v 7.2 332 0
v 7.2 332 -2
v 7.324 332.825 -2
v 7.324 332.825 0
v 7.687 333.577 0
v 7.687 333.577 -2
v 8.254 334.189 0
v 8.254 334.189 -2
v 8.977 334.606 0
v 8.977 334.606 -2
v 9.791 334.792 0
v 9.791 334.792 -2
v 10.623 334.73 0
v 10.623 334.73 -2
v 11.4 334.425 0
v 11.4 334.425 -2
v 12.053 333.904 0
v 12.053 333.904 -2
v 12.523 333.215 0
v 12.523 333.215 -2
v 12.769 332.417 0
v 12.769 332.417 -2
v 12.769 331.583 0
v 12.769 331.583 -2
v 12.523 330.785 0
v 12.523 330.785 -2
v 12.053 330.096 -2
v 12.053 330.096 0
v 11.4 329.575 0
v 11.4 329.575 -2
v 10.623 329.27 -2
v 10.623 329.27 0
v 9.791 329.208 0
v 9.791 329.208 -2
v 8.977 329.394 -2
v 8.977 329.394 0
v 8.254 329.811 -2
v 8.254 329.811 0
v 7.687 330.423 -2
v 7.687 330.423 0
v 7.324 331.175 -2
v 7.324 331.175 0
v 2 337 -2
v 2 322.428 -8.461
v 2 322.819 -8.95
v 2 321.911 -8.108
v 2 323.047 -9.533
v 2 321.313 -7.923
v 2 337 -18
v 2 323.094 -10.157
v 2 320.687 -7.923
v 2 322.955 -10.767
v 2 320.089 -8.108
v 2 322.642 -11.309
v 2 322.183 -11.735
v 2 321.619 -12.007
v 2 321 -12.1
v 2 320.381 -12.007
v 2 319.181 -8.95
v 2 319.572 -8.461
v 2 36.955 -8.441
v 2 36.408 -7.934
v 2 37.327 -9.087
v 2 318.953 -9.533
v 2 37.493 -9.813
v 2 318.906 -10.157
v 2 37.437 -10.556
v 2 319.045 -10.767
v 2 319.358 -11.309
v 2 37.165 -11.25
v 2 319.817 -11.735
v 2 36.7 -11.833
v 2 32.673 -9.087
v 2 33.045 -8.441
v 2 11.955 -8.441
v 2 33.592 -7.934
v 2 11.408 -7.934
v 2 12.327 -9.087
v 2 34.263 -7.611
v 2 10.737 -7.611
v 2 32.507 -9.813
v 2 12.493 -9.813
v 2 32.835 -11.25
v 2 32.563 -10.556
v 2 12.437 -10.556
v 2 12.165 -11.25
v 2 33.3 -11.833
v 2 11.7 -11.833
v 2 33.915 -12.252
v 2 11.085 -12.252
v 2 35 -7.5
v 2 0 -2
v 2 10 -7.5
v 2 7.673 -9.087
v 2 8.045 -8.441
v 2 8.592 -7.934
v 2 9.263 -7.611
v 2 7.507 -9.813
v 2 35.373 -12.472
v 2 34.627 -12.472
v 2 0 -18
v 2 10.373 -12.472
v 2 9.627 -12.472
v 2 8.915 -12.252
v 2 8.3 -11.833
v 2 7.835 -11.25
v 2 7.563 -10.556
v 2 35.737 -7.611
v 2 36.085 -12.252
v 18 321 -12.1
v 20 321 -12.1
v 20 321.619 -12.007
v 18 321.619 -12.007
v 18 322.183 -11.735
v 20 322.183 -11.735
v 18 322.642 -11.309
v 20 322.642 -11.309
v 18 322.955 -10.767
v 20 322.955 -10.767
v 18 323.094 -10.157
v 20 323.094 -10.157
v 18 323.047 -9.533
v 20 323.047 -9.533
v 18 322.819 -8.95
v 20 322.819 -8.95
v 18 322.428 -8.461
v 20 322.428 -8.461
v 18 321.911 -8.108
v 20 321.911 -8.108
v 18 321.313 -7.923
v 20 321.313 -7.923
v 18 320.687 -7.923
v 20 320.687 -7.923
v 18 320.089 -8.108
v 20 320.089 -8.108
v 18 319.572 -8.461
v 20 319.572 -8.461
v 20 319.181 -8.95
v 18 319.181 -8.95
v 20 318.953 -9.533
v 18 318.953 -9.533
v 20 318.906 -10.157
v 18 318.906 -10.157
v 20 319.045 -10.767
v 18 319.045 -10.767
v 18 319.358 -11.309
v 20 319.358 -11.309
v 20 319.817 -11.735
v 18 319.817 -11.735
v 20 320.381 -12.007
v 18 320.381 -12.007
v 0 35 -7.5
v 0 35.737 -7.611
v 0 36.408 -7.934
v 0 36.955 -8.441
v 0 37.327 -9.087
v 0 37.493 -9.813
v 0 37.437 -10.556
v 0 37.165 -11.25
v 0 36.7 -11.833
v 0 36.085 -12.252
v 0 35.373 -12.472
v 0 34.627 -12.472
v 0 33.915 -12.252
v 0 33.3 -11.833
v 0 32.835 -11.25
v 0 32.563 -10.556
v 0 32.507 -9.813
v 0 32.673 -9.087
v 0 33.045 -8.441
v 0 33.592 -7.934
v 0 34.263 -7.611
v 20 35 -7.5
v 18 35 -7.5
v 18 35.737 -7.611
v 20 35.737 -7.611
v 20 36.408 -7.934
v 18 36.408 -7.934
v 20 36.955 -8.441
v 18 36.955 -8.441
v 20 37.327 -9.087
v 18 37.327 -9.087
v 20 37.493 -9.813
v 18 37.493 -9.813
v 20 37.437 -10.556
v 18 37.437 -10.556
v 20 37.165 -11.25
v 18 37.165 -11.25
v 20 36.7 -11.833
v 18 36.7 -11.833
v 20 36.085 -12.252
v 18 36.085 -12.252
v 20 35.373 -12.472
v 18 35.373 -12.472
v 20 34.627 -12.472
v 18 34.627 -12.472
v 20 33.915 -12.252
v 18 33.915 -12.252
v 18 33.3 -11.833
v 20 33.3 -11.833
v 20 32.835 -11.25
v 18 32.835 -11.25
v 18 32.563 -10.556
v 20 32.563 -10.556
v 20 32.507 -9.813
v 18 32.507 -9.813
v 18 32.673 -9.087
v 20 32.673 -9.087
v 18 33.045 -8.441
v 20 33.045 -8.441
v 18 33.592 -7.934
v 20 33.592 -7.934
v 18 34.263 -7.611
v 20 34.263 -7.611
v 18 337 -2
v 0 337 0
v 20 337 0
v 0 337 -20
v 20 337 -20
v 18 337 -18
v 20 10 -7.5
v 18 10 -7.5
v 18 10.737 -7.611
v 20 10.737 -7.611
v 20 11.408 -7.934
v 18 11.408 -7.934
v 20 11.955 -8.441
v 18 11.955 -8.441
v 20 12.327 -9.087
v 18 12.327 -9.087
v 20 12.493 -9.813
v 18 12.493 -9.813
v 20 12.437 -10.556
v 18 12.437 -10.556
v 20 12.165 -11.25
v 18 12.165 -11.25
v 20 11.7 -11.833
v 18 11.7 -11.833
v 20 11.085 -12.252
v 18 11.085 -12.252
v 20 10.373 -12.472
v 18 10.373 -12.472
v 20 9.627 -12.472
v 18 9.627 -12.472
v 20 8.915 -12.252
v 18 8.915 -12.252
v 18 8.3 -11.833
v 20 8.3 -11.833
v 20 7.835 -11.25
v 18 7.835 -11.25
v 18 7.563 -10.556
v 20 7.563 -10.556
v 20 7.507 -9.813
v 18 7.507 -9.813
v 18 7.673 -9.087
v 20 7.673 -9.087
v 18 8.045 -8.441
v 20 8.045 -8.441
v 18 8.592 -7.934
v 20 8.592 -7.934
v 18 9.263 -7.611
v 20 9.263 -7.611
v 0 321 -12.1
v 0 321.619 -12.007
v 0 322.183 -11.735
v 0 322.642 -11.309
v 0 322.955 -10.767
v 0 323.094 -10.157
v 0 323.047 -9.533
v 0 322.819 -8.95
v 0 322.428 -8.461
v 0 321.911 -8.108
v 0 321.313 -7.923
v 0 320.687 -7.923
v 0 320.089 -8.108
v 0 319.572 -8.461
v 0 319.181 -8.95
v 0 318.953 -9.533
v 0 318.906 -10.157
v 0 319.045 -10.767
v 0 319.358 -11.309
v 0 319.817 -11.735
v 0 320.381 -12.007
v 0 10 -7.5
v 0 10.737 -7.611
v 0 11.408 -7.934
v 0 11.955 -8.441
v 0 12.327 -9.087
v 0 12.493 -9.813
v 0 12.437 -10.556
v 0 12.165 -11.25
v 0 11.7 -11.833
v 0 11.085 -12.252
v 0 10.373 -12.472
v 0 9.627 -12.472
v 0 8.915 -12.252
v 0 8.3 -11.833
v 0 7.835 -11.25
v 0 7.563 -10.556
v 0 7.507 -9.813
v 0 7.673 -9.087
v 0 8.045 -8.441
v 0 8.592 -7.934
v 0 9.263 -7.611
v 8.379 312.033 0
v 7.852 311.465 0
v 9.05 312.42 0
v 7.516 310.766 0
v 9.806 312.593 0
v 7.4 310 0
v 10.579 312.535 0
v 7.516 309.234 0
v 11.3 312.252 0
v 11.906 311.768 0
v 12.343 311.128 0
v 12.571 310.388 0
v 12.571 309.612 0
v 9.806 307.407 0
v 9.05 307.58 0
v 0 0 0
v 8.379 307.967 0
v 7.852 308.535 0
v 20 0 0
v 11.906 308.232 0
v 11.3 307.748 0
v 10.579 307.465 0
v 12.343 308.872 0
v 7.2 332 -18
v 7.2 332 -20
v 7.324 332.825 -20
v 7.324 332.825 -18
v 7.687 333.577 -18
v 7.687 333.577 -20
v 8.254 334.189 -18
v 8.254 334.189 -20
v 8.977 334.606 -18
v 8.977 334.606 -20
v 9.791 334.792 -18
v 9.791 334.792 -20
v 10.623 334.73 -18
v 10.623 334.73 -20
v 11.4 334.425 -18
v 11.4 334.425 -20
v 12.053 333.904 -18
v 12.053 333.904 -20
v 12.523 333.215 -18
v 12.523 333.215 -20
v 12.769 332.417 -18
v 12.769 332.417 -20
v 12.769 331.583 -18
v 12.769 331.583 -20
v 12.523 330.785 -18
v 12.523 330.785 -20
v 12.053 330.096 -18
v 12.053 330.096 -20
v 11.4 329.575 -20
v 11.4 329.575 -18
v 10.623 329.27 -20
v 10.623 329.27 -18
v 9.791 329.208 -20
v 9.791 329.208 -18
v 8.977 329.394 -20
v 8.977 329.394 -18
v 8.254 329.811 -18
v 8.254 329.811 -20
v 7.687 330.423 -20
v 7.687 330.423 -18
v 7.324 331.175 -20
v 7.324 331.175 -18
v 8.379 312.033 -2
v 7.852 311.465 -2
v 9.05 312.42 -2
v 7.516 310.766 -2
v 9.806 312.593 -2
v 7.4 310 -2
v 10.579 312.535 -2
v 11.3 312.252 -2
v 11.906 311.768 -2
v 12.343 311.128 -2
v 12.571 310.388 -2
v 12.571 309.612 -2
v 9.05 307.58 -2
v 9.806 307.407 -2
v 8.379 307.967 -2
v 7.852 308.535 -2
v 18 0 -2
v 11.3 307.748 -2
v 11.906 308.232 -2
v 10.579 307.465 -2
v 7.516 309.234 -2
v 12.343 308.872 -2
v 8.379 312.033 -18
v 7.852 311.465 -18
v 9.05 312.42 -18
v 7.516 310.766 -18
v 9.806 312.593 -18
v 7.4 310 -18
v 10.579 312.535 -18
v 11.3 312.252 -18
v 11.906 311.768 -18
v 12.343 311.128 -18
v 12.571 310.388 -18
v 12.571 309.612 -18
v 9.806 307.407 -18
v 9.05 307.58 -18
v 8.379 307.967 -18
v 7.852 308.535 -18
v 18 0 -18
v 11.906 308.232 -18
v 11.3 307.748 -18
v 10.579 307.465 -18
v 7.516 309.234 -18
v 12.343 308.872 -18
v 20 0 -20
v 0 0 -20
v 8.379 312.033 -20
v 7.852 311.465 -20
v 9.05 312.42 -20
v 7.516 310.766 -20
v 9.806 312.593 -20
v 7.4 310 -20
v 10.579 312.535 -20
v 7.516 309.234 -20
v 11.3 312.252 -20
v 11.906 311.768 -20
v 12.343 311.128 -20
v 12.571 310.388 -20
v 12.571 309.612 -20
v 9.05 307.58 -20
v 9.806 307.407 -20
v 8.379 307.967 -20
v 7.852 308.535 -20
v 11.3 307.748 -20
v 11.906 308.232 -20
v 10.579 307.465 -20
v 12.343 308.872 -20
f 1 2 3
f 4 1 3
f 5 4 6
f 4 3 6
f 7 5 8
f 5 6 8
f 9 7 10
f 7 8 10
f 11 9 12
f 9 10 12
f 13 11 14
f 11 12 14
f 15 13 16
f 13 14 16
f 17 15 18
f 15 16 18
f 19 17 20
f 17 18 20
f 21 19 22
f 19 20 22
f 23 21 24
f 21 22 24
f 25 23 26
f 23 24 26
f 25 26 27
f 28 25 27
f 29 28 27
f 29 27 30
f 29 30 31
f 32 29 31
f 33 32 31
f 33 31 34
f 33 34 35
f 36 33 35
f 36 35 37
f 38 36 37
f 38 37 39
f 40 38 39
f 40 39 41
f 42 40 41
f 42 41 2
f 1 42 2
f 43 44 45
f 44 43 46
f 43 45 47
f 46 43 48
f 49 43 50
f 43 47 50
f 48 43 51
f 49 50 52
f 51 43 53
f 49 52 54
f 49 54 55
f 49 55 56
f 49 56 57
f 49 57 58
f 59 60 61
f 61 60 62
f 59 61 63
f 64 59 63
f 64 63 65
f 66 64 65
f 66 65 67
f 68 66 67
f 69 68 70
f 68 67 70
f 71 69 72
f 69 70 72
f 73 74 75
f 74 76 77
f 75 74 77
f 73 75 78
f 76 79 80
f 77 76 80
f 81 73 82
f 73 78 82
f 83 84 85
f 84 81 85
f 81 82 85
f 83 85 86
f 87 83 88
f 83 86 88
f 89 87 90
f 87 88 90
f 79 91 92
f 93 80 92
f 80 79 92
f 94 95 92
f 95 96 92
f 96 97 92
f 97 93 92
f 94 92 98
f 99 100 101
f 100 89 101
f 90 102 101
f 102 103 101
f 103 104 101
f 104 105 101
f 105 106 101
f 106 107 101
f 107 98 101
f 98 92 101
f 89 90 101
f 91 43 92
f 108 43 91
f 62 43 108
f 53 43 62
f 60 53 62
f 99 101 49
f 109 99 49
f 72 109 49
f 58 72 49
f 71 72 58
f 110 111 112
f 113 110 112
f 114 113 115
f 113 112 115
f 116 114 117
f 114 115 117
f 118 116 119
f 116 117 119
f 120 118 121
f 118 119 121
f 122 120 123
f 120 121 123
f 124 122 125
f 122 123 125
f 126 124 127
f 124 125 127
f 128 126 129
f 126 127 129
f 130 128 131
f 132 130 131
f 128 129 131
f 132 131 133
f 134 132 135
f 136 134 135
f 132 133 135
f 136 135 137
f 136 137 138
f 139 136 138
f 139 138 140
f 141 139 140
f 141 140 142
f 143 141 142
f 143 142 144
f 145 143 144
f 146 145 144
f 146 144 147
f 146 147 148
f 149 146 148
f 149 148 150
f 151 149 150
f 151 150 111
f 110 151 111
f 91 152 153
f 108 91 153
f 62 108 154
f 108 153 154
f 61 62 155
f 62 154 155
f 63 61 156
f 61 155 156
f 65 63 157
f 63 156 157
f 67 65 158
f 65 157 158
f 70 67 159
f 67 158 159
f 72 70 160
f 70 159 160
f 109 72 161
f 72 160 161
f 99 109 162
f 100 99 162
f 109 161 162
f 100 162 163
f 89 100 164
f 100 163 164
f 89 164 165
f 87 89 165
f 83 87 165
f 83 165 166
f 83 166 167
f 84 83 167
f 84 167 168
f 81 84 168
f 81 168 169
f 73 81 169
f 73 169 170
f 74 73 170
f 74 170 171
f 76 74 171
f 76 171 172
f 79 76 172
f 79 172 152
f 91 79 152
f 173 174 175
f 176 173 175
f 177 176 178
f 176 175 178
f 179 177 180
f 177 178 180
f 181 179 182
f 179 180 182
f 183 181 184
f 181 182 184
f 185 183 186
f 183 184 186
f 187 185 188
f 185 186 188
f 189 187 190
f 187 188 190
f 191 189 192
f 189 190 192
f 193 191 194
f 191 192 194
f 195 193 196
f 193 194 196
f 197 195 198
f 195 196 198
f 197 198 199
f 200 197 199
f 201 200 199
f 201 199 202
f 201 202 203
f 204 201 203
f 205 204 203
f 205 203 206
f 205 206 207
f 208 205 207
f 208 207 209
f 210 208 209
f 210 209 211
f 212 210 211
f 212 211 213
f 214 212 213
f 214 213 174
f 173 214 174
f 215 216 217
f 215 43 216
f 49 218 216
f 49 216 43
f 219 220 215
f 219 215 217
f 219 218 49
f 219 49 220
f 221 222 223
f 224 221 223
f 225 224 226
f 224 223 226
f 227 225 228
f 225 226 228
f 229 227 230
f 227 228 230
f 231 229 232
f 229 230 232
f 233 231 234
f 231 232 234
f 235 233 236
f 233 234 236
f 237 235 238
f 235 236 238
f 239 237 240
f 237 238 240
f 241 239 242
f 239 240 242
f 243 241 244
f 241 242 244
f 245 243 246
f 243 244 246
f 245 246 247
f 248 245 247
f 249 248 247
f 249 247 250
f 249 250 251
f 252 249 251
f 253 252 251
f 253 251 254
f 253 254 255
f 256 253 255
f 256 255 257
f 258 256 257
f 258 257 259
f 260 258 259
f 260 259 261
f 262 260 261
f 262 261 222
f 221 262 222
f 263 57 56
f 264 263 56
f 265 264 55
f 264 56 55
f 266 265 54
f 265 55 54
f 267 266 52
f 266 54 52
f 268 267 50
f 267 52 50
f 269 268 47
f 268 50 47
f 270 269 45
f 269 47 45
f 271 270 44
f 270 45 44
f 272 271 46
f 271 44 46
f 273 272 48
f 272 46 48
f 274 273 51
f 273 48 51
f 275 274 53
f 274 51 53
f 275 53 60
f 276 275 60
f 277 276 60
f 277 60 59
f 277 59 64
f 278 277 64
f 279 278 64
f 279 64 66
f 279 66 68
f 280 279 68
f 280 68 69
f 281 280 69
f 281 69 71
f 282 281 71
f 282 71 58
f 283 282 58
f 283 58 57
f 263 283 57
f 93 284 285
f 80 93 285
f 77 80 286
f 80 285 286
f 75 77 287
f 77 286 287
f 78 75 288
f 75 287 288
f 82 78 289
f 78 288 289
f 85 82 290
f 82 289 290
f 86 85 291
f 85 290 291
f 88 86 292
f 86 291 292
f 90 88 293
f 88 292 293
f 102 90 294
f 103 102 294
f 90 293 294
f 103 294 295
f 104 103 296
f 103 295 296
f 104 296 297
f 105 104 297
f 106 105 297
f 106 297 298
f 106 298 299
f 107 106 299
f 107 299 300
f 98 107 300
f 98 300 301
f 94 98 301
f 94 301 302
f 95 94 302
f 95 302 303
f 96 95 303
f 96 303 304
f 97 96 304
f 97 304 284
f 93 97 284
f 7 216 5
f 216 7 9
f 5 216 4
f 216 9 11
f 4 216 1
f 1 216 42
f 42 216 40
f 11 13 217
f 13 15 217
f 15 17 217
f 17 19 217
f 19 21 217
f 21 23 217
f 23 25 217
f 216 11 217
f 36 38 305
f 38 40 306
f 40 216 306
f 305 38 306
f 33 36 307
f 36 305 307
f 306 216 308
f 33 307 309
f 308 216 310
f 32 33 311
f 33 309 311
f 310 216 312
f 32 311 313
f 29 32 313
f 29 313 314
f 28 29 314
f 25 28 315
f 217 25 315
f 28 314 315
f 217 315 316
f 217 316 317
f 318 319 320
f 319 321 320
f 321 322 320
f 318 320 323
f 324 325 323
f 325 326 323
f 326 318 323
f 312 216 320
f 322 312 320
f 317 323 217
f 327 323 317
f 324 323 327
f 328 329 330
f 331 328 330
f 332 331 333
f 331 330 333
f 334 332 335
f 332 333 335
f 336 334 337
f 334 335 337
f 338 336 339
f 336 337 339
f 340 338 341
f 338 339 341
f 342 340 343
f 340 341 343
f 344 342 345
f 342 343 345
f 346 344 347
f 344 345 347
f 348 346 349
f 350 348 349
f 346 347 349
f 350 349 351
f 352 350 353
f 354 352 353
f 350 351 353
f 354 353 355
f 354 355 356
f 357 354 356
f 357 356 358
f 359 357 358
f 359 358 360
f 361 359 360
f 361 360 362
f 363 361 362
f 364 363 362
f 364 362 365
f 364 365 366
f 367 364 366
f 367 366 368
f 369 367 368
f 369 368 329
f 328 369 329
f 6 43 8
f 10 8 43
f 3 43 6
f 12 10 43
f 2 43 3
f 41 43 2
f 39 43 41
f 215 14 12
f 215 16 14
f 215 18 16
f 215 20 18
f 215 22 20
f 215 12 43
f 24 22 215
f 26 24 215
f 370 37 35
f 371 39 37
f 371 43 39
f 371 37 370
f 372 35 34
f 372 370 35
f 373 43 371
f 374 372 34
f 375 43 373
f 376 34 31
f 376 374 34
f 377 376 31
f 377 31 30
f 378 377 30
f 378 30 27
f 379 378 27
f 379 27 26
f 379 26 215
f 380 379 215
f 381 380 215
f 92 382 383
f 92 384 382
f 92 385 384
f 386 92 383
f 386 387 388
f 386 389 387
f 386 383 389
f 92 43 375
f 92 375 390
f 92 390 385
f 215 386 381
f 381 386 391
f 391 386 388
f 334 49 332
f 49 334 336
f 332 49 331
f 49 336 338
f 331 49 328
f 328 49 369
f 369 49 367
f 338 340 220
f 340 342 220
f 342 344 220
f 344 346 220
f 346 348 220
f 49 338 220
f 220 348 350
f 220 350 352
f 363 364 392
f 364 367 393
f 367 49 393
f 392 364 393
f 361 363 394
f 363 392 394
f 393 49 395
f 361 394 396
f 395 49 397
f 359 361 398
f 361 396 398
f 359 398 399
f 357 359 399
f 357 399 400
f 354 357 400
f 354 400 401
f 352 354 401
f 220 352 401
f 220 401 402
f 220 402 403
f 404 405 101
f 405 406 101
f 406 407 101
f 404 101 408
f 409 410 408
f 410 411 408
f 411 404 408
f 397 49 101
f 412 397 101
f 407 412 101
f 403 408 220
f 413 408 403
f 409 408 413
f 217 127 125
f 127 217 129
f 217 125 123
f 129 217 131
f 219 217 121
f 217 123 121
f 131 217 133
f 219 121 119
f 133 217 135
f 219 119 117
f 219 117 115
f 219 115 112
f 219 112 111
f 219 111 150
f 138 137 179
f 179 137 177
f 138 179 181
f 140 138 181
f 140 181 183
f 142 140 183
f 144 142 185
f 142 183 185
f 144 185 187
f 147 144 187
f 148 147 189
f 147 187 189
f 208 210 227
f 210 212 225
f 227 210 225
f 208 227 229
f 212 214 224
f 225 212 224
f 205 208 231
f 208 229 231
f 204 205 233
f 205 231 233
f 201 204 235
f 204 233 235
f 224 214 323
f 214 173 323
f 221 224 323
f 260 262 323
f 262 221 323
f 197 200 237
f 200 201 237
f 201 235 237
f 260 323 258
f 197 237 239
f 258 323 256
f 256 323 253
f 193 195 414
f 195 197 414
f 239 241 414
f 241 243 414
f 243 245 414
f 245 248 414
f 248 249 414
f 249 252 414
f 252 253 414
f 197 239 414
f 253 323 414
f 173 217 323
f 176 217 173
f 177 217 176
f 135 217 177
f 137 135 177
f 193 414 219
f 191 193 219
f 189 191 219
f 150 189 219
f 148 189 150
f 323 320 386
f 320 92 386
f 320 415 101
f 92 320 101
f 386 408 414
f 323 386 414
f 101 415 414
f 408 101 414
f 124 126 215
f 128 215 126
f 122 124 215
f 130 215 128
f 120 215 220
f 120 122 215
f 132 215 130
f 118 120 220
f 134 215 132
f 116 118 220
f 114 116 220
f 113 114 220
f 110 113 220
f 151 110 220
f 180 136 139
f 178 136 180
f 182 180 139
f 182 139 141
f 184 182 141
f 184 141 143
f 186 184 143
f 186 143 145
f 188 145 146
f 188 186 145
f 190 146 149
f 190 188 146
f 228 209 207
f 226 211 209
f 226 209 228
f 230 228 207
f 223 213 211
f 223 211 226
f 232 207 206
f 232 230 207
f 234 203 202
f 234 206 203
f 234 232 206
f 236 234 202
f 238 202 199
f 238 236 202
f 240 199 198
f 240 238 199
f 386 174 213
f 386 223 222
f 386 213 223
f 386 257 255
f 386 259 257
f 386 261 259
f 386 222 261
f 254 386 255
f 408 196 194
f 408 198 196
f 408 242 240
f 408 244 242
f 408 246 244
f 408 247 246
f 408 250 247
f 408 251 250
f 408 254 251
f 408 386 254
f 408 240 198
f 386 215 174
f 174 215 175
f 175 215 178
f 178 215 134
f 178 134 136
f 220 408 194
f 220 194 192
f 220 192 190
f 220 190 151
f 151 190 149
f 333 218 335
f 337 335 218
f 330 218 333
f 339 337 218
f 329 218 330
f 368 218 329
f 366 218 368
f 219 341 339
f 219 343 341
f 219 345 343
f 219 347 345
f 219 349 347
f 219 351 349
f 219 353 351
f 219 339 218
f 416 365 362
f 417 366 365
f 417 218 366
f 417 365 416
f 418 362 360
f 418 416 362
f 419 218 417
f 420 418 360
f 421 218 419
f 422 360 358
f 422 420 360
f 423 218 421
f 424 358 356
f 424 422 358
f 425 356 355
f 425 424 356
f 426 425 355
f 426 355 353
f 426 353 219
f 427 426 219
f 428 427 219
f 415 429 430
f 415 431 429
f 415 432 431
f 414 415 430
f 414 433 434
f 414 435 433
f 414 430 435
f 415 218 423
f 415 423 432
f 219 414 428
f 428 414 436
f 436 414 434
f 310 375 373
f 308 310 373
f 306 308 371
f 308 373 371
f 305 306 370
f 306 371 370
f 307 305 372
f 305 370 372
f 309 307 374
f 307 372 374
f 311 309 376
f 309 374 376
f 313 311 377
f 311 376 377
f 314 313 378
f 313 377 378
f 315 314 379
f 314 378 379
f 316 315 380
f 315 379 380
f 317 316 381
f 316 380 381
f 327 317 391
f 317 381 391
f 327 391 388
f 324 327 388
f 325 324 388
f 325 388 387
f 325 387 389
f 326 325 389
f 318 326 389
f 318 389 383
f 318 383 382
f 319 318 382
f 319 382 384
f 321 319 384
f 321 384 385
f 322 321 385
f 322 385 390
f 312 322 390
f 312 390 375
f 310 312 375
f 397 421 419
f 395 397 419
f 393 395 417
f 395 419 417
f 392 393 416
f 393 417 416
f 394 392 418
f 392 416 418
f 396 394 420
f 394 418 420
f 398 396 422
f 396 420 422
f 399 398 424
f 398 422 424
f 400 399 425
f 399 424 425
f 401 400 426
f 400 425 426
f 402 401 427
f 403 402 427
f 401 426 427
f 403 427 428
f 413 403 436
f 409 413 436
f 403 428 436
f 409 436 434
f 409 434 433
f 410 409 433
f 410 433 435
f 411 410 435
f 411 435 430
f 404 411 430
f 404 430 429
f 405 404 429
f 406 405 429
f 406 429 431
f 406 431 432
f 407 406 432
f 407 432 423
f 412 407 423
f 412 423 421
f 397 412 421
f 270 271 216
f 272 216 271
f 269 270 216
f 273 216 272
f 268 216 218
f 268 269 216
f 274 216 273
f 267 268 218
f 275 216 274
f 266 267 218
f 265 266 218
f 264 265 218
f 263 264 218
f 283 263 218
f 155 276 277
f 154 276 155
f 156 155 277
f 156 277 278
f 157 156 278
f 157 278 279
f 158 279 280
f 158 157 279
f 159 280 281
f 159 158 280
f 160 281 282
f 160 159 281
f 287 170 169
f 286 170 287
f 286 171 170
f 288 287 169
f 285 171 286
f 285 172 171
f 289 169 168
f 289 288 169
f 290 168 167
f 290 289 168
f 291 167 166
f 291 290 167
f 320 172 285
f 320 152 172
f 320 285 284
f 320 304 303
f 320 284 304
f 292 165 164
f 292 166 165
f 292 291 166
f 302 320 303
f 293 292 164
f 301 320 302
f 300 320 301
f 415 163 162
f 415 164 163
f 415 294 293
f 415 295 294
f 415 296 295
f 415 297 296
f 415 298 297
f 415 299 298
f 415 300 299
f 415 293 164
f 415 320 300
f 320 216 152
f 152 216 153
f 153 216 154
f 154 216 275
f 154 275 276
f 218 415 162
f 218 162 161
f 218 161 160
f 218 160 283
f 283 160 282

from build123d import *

# Parameters (mm, degrees)
ESBO_O1_W             = 20
ESBO_O1_H             = 20
ESBO_O1_W_2           = 16
ESBO_O1_H_2           = 16
EXTRUS_O_FINA1_DEPTH  = 337
ESBO_O2_R             = 2.5
CORTE_EXTRUS_O1_DEPTH = 21
ESBO_O3_R             = 2.6
ESBO_O3_R_2           = 2.8
CORTE_EXTRUS_O2_DEPTH = 21
ESBO_O4_R             = 2.1
CORTE_EXTRUS_O3_DEPTH = 21


with BuildPart() as part:
    # Esboço1 → Extrusão-Fina1 (new body)
    with BuildSketch(Plane(origin=(0, 0, 0), x_dir=(1, 0, 0), z_dir=(0, 1, 0))):
        with Locations((10, 10)):
            Rectangle(ESBO_O1_W, ESBO_O1_H)
        with Locations((10, 10)):
            Rectangle(ESBO_O1_W_2, ESBO_O1_H_2, mode=Mode.SUBTRACT)
    extrude(amount=EXTRUS_O_FINA1_DEPTH)

    # Esboço2 → Corte-extrusão1 (cut, through all)
    with BuildSketch(Plane.ZY):
        with Locations((-10, 35)):
            Circle(ESBO_O2_R)
        with Locations((-10, 10)):
            Circle(ESBO_O2_R)
    extrude(amount=-CORTE_EXTRUS_O1_DEPTH, mode=Mode.SUBTRACT)

    # Esboço3 → Corte-extrusão2 (cut, through all)
    with BuildSketch(Plane(origin=(0, 0, -20), x_dir=(-1, 0, 0), z_dir=(0, 0, -1))):
        with Locations((-10, 310)):
            Circle(ESBO_O3_R)
        with Locations((-10, 332)):
            Circle(ESBO_O3_R_2)
    extrude(amount=-CORTE_EXTRUS_O2_DEPTH, mode=Mode.SUBTRACT)

    # Esboço4 → Corte-extrusão3 (cut, through all)
    with BuildSketch(Plane(origin=(20, 0, 0), x_dir=(0, 0, -1), z_dir=(1, 0, 0))):
        with Locations((10, 321)):
            Circle(ESBO_O4_R)
    extrude(amount=-CORTE_EXTRUS_O3_DEPTH, mode=Mode.SUBTRACT)


solid = part.part
